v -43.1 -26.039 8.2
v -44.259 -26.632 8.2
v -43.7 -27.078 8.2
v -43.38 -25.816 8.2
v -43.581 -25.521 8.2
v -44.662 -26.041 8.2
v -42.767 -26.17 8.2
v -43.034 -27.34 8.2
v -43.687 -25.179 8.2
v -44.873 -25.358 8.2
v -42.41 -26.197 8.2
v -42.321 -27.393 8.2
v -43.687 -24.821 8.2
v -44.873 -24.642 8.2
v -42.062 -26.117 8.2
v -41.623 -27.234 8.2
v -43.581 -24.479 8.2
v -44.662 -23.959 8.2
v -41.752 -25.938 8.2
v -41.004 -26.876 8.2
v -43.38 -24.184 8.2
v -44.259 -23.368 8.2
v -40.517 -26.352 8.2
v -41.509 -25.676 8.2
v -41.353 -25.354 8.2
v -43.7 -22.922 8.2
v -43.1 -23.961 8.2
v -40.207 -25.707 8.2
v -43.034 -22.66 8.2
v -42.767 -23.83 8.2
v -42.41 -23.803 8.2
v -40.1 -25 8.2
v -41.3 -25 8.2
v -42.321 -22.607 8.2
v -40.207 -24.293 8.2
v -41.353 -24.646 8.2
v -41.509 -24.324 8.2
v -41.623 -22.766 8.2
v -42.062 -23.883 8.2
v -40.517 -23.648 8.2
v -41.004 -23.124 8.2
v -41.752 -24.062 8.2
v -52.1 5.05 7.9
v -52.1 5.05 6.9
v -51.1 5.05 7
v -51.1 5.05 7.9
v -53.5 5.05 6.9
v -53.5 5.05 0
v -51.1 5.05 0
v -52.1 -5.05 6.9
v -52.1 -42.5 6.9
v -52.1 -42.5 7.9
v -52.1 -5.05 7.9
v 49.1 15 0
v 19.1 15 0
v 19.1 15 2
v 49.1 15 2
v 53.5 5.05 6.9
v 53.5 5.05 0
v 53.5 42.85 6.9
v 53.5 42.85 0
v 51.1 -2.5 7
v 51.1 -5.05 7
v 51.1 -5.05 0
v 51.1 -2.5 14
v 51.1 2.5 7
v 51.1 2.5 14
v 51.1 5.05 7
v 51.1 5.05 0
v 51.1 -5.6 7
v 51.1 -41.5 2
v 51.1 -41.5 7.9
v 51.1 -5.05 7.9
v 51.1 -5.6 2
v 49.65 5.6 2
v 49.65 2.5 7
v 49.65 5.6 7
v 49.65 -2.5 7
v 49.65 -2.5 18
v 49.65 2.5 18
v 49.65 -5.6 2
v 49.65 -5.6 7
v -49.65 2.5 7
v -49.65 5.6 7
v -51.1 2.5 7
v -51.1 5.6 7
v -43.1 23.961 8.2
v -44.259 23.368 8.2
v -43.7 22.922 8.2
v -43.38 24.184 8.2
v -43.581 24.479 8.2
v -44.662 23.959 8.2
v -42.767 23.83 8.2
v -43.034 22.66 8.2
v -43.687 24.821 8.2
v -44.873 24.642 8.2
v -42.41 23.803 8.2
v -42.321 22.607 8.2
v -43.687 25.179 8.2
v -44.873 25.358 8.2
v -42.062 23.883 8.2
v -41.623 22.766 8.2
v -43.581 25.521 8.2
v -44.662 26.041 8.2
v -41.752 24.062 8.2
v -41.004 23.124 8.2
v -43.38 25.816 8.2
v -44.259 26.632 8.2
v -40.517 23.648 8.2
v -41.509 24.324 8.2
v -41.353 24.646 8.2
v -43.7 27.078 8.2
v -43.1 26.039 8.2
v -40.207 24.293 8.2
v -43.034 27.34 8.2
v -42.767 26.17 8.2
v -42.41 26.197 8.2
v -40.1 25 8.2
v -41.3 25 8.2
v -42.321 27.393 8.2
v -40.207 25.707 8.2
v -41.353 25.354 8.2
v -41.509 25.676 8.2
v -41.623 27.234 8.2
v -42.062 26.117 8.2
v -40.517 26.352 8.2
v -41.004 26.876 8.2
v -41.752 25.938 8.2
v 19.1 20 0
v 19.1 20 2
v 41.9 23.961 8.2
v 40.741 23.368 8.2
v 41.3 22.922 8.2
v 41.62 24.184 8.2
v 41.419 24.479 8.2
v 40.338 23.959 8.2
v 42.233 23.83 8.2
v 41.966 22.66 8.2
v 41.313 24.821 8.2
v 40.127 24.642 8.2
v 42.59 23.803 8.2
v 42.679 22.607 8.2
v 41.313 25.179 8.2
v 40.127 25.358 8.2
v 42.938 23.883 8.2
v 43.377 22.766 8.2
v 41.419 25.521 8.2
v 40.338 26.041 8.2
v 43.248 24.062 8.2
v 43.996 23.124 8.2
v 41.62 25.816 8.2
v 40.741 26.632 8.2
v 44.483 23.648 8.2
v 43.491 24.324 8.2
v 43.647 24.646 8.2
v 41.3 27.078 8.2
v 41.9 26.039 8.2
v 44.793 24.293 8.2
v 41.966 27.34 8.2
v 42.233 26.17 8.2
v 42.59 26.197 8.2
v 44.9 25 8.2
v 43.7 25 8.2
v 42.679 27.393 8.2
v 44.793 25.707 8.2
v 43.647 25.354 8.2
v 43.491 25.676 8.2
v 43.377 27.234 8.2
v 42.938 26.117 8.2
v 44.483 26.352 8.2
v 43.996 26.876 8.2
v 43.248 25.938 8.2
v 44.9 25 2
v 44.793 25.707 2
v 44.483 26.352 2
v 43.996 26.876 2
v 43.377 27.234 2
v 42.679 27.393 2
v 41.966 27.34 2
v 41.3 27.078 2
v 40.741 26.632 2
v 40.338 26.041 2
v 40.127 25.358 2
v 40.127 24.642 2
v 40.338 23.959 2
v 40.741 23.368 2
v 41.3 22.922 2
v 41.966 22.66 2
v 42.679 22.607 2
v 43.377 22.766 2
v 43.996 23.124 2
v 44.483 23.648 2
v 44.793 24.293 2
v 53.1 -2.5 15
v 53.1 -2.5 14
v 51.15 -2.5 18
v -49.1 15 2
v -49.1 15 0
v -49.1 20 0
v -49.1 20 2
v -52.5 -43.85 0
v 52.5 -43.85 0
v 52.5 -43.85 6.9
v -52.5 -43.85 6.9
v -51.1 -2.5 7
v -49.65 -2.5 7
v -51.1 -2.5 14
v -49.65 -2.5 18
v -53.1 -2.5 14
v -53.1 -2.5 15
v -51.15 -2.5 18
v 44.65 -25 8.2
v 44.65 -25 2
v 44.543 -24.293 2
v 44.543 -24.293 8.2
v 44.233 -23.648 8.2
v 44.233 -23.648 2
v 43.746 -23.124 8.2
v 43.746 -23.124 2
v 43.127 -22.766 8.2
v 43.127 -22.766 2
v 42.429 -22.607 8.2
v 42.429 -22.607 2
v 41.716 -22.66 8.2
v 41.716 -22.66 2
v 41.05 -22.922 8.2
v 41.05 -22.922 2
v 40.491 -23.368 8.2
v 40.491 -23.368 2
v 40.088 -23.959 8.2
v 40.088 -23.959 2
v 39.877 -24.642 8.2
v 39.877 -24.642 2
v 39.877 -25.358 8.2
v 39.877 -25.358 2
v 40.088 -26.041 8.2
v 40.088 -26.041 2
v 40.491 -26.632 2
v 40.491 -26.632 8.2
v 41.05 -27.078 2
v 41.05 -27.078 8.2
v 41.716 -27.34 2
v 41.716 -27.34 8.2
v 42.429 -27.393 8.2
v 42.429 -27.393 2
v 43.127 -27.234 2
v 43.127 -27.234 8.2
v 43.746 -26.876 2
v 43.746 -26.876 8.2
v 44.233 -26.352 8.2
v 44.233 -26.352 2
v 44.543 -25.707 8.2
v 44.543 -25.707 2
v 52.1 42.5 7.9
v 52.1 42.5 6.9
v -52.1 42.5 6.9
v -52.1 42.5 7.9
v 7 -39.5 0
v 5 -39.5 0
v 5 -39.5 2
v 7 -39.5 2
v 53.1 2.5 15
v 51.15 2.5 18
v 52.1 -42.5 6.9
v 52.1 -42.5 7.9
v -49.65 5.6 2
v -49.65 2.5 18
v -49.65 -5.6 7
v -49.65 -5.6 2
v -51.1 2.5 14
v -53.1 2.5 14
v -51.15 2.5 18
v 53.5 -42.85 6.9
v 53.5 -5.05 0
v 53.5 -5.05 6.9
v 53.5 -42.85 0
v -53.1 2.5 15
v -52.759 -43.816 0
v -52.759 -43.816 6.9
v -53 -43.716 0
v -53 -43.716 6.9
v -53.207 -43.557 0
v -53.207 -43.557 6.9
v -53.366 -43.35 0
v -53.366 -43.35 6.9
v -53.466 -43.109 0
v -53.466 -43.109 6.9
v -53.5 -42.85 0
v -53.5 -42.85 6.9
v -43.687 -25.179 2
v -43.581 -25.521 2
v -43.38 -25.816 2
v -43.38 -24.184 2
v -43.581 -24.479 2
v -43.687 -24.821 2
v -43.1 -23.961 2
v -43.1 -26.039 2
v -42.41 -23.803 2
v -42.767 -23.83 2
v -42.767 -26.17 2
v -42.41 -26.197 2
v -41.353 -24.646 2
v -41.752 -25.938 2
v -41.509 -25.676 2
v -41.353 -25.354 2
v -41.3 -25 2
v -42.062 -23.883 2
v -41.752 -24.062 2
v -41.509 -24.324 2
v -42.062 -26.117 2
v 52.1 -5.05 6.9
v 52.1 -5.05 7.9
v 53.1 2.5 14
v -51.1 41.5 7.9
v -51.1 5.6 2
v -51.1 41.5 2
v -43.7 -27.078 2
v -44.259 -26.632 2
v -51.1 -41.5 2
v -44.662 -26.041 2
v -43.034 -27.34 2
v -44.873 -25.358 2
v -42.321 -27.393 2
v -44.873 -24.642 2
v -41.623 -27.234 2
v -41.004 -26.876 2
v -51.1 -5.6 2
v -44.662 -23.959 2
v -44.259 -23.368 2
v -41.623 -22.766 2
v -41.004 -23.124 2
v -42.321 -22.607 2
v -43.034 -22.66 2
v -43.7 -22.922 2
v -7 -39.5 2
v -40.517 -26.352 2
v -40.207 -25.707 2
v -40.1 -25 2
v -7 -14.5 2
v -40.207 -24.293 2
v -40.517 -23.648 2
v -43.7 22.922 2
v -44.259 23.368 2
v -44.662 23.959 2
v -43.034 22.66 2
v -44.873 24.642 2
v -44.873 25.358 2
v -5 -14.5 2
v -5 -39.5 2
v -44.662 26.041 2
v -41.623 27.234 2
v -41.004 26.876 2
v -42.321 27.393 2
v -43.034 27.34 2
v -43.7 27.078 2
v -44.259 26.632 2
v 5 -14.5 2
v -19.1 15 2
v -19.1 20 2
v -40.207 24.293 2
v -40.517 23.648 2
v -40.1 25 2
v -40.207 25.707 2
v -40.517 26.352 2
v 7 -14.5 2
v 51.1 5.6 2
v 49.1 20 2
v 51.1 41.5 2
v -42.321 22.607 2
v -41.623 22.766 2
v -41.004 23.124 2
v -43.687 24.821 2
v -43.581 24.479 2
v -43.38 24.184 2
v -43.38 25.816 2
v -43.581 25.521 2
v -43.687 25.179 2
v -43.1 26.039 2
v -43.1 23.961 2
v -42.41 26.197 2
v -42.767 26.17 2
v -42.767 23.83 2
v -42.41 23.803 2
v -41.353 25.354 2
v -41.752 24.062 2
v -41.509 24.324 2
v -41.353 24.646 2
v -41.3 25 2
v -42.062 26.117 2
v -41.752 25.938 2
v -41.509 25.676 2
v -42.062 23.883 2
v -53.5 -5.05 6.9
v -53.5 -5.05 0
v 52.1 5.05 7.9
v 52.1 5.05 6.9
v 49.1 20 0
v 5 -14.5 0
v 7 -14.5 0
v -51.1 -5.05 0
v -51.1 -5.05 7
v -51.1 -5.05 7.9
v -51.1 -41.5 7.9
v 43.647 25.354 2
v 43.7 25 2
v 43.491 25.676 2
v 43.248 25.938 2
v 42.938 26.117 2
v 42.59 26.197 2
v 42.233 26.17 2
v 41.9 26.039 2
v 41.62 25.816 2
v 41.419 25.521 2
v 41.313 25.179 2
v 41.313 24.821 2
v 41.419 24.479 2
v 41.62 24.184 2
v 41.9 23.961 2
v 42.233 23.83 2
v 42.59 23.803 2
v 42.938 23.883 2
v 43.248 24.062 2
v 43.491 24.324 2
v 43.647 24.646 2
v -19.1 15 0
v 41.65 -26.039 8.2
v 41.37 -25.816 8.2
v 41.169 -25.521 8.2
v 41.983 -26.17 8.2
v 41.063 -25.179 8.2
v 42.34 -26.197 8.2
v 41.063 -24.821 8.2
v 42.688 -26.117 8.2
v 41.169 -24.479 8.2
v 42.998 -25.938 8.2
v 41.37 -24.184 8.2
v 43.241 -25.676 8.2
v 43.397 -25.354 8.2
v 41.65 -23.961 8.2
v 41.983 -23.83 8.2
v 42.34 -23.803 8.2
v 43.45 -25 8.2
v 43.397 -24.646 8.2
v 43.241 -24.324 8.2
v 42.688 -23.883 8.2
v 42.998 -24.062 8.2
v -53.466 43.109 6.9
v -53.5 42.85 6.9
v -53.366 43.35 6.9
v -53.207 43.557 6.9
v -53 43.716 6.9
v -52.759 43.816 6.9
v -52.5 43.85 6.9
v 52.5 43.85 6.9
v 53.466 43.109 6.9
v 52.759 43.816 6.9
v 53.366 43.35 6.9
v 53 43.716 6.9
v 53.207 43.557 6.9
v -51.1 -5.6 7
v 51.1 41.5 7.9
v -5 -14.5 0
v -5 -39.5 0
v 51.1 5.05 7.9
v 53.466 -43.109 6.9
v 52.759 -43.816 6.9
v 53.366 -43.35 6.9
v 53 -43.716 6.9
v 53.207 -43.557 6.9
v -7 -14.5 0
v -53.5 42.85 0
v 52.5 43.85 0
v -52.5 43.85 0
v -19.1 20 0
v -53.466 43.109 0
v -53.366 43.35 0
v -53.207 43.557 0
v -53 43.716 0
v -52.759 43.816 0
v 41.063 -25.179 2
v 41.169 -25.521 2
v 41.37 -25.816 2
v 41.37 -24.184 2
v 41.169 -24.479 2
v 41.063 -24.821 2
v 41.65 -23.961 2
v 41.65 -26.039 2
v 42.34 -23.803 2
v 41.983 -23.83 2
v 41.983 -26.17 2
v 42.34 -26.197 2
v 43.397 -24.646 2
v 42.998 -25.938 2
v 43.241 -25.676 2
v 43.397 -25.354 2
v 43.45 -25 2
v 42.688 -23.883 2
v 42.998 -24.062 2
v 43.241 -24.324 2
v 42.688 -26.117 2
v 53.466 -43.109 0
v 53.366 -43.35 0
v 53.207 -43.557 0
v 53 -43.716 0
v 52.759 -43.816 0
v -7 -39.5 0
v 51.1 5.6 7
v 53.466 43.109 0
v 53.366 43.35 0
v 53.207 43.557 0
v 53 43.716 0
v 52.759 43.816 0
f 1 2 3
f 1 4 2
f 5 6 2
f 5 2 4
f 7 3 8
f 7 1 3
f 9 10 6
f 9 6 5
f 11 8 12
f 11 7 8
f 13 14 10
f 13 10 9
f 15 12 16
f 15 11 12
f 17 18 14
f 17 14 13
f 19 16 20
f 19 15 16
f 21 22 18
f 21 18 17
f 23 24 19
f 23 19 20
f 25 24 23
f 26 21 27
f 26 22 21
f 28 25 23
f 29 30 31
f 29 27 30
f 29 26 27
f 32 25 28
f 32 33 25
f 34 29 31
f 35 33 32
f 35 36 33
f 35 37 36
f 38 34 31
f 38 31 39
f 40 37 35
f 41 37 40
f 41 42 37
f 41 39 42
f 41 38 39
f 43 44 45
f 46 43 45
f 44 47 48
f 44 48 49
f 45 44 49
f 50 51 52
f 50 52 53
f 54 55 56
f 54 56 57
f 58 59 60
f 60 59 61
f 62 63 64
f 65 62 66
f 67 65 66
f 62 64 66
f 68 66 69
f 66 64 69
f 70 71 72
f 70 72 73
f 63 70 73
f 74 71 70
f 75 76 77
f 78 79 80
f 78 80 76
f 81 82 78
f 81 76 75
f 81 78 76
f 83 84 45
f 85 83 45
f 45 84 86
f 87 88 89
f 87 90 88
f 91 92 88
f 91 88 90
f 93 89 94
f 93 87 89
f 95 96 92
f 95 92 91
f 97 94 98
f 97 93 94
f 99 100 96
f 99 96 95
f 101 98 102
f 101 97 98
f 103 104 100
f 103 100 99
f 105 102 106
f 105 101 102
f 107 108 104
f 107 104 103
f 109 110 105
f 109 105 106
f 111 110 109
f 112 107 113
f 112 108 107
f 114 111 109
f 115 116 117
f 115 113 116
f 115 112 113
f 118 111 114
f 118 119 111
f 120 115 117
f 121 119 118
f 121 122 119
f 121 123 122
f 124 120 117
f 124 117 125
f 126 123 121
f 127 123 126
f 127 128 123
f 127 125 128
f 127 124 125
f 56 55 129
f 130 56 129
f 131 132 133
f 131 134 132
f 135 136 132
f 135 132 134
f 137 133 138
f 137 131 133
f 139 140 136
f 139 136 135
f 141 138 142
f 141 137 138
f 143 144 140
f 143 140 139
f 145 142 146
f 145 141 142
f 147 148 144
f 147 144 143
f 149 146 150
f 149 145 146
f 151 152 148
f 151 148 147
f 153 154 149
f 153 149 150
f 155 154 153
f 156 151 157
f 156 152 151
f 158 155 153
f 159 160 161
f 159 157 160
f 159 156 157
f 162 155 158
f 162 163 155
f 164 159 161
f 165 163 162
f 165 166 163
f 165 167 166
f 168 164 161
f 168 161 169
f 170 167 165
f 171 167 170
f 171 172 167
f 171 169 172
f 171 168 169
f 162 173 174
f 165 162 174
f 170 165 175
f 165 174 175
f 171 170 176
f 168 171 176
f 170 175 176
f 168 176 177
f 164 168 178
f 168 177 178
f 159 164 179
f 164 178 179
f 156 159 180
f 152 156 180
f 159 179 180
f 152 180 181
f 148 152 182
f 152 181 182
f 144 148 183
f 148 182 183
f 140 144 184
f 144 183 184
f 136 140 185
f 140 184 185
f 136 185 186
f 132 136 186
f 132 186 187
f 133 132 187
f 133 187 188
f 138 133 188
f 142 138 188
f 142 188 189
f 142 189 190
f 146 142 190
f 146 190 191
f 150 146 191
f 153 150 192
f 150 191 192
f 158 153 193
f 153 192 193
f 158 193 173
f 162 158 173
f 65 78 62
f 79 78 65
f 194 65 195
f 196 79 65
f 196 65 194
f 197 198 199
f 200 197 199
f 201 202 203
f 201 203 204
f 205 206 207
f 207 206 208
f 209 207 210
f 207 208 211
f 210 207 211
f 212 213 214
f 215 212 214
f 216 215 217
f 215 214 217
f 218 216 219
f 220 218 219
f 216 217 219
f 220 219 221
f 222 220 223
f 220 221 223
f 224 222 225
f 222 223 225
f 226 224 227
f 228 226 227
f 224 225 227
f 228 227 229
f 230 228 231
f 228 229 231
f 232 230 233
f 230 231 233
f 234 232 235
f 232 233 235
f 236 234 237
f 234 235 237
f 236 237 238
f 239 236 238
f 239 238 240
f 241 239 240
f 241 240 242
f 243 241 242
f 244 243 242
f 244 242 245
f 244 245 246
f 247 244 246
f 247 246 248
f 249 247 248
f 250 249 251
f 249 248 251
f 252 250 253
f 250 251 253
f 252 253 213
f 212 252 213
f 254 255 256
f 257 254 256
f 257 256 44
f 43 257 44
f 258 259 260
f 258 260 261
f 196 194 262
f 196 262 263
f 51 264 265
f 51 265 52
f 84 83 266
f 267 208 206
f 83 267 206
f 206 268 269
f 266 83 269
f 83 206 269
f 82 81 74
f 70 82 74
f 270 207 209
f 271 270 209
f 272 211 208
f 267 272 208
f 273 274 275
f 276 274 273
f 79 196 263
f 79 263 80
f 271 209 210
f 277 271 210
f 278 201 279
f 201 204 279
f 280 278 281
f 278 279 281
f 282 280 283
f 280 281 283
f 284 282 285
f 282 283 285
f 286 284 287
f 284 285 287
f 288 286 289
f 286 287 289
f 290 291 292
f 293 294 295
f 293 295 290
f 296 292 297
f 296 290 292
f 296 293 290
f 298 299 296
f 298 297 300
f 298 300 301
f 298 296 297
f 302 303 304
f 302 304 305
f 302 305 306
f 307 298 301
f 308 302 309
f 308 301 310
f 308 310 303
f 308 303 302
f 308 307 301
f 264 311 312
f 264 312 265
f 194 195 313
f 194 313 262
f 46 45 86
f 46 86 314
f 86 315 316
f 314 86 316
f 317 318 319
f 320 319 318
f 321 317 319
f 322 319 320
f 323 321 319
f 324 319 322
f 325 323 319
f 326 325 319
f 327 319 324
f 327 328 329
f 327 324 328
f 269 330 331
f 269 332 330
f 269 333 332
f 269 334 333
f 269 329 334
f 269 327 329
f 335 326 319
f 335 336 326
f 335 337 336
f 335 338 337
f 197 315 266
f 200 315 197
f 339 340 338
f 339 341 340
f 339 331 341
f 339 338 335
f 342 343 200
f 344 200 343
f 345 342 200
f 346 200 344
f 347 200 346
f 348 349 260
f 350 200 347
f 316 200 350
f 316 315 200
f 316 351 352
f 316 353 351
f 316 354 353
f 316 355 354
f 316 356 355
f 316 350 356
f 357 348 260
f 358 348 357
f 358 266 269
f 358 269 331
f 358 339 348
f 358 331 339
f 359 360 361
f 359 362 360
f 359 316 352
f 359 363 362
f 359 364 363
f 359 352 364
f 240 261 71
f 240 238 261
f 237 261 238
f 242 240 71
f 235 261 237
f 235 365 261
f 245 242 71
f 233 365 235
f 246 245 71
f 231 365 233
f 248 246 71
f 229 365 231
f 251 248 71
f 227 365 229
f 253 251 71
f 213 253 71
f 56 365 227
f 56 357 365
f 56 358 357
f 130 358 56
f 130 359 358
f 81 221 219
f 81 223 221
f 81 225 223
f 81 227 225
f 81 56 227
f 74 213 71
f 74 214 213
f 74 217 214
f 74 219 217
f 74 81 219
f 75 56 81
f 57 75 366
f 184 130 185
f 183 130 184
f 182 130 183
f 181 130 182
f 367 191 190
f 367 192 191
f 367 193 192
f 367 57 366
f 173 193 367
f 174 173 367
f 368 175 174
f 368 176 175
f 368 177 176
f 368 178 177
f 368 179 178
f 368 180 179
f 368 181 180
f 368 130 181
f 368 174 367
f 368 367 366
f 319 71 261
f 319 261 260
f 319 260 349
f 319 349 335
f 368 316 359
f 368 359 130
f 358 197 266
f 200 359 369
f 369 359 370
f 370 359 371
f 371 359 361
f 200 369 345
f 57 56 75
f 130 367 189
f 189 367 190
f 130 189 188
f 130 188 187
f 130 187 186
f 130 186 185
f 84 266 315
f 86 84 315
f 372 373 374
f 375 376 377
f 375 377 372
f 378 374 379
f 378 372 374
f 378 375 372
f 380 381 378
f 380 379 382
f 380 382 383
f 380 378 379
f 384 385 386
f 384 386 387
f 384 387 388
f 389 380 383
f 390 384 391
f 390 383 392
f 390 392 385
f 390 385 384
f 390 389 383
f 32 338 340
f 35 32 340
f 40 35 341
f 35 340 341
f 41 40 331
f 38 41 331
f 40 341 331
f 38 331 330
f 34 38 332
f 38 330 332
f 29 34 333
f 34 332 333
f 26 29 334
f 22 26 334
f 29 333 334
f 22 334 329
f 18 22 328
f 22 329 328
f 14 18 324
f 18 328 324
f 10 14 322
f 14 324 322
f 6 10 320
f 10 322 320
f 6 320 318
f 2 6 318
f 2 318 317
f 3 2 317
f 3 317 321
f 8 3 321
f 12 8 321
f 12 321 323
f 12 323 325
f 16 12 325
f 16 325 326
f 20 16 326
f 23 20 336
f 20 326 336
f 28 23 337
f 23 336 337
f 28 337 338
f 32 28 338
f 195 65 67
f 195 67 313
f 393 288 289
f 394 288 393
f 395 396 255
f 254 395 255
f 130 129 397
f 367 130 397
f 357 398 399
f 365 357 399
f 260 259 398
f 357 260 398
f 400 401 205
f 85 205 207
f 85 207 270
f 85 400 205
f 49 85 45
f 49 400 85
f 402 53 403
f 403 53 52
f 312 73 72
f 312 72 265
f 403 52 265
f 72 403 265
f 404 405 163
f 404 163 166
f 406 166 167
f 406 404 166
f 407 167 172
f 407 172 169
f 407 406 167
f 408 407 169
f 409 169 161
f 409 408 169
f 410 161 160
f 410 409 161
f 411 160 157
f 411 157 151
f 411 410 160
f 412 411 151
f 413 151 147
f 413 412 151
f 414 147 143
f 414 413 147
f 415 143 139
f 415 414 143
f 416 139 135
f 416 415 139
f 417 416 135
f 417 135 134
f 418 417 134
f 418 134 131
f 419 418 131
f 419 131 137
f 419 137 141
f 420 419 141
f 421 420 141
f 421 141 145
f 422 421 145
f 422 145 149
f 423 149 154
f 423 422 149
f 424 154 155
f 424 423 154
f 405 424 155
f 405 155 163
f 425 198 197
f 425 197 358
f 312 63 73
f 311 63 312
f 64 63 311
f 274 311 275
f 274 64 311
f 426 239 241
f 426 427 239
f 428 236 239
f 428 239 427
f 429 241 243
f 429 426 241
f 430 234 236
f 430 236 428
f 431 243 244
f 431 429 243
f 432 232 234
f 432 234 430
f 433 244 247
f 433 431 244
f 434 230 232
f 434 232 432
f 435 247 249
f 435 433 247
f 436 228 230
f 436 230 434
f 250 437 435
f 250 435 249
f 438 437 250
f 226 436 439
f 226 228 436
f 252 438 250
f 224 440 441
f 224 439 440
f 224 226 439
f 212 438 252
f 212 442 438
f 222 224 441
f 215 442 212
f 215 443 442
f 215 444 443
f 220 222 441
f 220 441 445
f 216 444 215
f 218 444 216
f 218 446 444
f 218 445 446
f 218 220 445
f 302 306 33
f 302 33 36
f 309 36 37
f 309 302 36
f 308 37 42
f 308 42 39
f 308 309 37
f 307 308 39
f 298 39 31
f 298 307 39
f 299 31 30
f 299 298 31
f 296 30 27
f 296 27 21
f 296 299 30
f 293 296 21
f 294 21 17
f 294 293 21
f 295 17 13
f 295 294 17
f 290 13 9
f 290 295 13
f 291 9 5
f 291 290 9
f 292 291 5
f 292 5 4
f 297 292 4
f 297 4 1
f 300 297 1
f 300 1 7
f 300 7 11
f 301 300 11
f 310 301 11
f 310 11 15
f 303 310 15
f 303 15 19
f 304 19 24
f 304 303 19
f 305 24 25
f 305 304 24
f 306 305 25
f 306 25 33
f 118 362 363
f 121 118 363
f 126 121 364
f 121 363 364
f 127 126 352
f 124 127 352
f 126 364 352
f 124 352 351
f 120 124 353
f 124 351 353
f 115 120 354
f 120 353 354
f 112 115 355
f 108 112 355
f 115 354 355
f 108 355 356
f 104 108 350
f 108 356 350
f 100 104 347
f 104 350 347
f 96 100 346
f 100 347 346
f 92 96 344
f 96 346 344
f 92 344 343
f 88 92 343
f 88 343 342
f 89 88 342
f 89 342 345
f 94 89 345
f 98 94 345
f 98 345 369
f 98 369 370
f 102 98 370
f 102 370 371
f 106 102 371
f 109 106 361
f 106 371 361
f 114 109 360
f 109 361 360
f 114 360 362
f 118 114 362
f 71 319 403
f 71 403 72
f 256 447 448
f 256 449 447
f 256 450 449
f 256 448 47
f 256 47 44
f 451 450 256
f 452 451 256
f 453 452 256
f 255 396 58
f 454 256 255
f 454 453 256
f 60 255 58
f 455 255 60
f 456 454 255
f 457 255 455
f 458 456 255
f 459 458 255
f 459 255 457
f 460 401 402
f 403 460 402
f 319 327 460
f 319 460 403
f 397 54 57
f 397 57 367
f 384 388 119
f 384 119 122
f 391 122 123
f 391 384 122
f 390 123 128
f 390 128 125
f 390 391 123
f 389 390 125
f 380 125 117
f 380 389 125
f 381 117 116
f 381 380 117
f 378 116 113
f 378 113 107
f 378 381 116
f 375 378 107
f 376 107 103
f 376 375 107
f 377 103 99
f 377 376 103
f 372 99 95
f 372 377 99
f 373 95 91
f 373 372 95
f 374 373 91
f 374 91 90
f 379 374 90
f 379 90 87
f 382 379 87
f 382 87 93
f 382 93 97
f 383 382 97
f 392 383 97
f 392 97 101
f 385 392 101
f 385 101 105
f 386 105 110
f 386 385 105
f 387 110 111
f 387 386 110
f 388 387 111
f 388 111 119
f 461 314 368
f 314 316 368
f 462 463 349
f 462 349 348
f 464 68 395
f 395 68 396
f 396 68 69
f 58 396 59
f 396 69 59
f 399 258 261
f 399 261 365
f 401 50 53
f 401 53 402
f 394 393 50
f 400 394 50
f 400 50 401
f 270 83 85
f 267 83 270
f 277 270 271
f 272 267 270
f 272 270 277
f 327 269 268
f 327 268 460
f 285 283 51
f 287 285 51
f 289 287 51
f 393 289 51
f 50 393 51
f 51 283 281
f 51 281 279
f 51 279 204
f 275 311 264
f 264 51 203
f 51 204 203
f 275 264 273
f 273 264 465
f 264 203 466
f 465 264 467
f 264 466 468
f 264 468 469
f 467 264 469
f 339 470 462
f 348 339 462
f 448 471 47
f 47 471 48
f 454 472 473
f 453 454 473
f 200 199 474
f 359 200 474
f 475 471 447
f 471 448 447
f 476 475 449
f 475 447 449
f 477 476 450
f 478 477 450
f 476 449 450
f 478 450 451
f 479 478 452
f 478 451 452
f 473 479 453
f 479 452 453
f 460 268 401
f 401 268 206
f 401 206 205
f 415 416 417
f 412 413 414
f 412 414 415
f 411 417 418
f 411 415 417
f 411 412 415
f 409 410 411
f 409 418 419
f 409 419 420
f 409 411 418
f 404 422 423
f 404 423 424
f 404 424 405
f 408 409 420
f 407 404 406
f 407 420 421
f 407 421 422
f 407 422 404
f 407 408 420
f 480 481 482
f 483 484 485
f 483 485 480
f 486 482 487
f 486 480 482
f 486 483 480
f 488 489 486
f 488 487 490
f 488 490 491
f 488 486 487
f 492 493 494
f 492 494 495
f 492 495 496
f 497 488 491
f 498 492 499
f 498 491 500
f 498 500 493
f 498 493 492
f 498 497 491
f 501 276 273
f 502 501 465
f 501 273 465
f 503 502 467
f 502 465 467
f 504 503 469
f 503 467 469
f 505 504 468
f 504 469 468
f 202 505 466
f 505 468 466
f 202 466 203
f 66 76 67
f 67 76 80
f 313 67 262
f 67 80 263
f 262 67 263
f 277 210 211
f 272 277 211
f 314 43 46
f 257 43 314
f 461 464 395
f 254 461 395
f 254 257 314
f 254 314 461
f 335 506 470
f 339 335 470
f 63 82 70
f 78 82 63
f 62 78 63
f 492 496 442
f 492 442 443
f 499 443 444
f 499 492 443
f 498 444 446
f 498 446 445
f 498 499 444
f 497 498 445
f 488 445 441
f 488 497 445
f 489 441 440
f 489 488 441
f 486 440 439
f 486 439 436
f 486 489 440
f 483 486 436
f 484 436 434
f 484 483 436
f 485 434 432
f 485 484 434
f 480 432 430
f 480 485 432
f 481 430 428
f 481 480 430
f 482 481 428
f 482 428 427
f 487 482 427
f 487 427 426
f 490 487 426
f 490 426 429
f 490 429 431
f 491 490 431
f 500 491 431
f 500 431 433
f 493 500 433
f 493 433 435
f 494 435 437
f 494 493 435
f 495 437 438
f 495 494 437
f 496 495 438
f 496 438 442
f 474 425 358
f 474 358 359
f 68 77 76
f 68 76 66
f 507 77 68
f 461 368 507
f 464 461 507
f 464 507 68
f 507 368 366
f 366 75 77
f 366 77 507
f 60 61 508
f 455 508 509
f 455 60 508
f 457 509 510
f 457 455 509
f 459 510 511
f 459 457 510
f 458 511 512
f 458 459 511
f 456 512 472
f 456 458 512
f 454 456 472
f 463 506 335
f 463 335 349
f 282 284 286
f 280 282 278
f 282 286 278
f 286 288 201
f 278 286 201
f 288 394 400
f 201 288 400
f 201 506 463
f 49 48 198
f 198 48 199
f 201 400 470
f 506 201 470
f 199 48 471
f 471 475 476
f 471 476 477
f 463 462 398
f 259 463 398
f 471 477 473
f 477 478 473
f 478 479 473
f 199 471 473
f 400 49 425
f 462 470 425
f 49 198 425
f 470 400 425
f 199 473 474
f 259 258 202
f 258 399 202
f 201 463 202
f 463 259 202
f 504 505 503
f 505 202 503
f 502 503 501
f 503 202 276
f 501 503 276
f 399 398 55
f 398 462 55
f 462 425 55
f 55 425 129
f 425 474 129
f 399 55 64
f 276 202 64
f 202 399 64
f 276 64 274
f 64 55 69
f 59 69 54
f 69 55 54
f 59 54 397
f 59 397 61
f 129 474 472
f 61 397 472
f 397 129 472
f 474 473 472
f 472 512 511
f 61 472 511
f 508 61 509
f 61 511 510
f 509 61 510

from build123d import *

# Parameters (mm, degrees)
SKETCH_W      = 102.2
SKETCH_H      = 83
SKETCH_W_2    = 30
SKETCH_H_2    = 5
SKETCH_W_3    = 2
SKETCH_H_3    = 25
PAD_DEPTH     = 2
SKETCH001_R   = 2.4
SKETCH001_R_2 = 1.2
PAD001_DEPTH  = 6.2
PAD002_DEPTH  = 6.9
PAD003_DEPTH  = 1
SKETCH004_W   = 1.45
SKETCH004_H   = 11.2
PAD004_DEPTH  = 5
SKETCH005_W   = 1.45
SKETCH005_H   = 5
PAD005_DEPTH  = 7
PAD006_DEPTH  = 5
FILLET_R      = 1
FILLET001_R   = 1
FILLET002_R   = 1
FILLET003_R   = 1


with BuildPart() as part:
    # Sketch → Pad (new body)
    with BuildSketch(Plane.XY):
        Rectangle(SKETCH_W, SKETCH_H)
        with Locations((34.1, 17.5)):
            Rectangle(SKETCH_W_2, SKETCH_H_2, mode=Mode.SUBTRACT)
        with Locations((-34.1, 17.5)):
            Rectangle(SKETCH_W_2, SKETCH_H_2, mode=Mode.SUBTRACT)
        with Locations((6, -27)):
            Rectangle(SKETCH_W_3, SKETCH_H_3, mode=Mode.SUBTRACT)
        with Locations((-6, -27)):
            Rectangle(SKETCH_W_3, SKETCH_H_3, mode=Mode.SUBTRACT)
    extrude(amount=PAD_DEPTH)

    # Sketch001 (on Face22 of Pad) → Pad001 (join)
    with BuildSketch(Plane.XY.offset(2)):
        with Locations((-42.5, -25)):
            Circle(SKETCH001_R)
        with Locations((-42.5, -25)):
            Circle(SKETCH001_R_2, mode=Mode.SUBTRACT)
        with Locations((42.5, 25)):
            Circle(SKETCH001_R)
        with Locations((42.5, 25)):
            Circle(SKETCH001_R_2, mode=Mode.SUBTRACT)
        with Locations((42.25, -25)):
            Circle(SKETCH001_R)
        with Locations((42.25, -25)):
            Circle(SKETCH001_R_2, mode=Mode.SUBTRACT)
        with Locations((-42.5, 25)):
            Circle(SKETCH001_R)
        with Locations((-42.5, 25)):
            Circle(SKETCH001_R_2, mode=Mode.SUBTRACT)
    extrude(amount=PAD001_DEPTH)

    # Sketch002 → Pad002 (join)
    with BuildSketch(Plane.XY):
        Polygon((-51.1, 41.5), (51.1, 41.5), (51.1, 5.05), (53.5, 5.05), (53.5, 43.85), (-53.5, 43.85), (-53.5, 5.05), (-51.1, 5.05), align=None)
    pad002 = extrude(amount=PAD002_DEPTH)

    # Mirrored: Pad002 across XZ
    add(pad002.mirror(Plane.XZ))

    # Sketch003 (on Face38 of Mirrored) → Pad003 (join)
    with BuildSketch(Plane.XY.offset(6.9)):
        Polygon((-51.1, 5.05), (-51.1, 41.5), (51.1, 41.5), (51.1, 5.05), (52.1, 5.05), (52.1, 42.5), (-52.1, 42.5), (-52.1, 5.05), align=None)
    pad003 = extrude(amount=PAD003_DEPTH)

    # Mirrored001: Pad003 across XZ
    add(pad003.mirror(Plane.XZ))

    # Sketch004 (on Face3 of Mirrored001) → Pad004 (join)
    with BuildSketch(Plane.XY.offset(2)):
        with Locations((50.375, 0)):
            Rectangle(SKETCH004_W, SKETCH004_H)
    pad004 = extrude(amount=PAD004_DEPTH)

    # Mirrored002: Pad004 across YZ
    add(pad004.mirror(Plane.YZ))

    # Sketch005 (on Face40 of Mirrored002) → Pad005 (join)
    with BuildSketch(Plane.XY.offset(7)):
        with Locations((50.375, 0)):
            Rectangle(SKETCH005_W, SKETCH005_H)
    pad005 = extrude(amount=PAD005_DEPTH)

    # Mirrored003: Pad005 across YZ
    add(pad005.mirror(Plane.YZ))

    # Sketch006 (on Face2 of Mirrored003) → Pad006 (join)
    with BuildSketch(Plane.XZ.offset(2.5)):
        Polygon((49.65, 14), (51.1, 14), (53.1, 14), (53.1, 15), (51.15, 18), (49.65, 18), align=None)
    pad006 = extrude(amount=-PAD006_DEPTH)

    # Mirrored004: Pad006 across YZ
    add(pad006.mirror(Plane.YZ))

    # Fillet
    fillet_edges = [part.edges().sort_by_distance(p)[0] for p in [
        (53.5, -43.85, 3.45),
    ]]
    fillet(fillet_edges, radius=FILLET_R)

    # Fillet001
    fillet001_edges = [part.edges().sort_by_distance(p)[0] for p in [
        (53.5, 43.85, 3.45),
    ]]
    fillet(fillet001_edges, radius=FILLET001_R)

    # Fillet002
    fillet002_edges = [part.edges().sort_by_distance(p)[0] for p in [
        (-53.5, -43.85, 3.45),
    ]]
    fillet(fillet002_edges, radius=FILLET002_R)

    # Fillet003
    fillet003_edges = [part.edges().sort_by_distance(p)[0] for p in [
        (-53.5, 43.85, 3.45),
    ]]
    fillet(fillet003_edges, radius=FILLET003_R)


solid = part.part
